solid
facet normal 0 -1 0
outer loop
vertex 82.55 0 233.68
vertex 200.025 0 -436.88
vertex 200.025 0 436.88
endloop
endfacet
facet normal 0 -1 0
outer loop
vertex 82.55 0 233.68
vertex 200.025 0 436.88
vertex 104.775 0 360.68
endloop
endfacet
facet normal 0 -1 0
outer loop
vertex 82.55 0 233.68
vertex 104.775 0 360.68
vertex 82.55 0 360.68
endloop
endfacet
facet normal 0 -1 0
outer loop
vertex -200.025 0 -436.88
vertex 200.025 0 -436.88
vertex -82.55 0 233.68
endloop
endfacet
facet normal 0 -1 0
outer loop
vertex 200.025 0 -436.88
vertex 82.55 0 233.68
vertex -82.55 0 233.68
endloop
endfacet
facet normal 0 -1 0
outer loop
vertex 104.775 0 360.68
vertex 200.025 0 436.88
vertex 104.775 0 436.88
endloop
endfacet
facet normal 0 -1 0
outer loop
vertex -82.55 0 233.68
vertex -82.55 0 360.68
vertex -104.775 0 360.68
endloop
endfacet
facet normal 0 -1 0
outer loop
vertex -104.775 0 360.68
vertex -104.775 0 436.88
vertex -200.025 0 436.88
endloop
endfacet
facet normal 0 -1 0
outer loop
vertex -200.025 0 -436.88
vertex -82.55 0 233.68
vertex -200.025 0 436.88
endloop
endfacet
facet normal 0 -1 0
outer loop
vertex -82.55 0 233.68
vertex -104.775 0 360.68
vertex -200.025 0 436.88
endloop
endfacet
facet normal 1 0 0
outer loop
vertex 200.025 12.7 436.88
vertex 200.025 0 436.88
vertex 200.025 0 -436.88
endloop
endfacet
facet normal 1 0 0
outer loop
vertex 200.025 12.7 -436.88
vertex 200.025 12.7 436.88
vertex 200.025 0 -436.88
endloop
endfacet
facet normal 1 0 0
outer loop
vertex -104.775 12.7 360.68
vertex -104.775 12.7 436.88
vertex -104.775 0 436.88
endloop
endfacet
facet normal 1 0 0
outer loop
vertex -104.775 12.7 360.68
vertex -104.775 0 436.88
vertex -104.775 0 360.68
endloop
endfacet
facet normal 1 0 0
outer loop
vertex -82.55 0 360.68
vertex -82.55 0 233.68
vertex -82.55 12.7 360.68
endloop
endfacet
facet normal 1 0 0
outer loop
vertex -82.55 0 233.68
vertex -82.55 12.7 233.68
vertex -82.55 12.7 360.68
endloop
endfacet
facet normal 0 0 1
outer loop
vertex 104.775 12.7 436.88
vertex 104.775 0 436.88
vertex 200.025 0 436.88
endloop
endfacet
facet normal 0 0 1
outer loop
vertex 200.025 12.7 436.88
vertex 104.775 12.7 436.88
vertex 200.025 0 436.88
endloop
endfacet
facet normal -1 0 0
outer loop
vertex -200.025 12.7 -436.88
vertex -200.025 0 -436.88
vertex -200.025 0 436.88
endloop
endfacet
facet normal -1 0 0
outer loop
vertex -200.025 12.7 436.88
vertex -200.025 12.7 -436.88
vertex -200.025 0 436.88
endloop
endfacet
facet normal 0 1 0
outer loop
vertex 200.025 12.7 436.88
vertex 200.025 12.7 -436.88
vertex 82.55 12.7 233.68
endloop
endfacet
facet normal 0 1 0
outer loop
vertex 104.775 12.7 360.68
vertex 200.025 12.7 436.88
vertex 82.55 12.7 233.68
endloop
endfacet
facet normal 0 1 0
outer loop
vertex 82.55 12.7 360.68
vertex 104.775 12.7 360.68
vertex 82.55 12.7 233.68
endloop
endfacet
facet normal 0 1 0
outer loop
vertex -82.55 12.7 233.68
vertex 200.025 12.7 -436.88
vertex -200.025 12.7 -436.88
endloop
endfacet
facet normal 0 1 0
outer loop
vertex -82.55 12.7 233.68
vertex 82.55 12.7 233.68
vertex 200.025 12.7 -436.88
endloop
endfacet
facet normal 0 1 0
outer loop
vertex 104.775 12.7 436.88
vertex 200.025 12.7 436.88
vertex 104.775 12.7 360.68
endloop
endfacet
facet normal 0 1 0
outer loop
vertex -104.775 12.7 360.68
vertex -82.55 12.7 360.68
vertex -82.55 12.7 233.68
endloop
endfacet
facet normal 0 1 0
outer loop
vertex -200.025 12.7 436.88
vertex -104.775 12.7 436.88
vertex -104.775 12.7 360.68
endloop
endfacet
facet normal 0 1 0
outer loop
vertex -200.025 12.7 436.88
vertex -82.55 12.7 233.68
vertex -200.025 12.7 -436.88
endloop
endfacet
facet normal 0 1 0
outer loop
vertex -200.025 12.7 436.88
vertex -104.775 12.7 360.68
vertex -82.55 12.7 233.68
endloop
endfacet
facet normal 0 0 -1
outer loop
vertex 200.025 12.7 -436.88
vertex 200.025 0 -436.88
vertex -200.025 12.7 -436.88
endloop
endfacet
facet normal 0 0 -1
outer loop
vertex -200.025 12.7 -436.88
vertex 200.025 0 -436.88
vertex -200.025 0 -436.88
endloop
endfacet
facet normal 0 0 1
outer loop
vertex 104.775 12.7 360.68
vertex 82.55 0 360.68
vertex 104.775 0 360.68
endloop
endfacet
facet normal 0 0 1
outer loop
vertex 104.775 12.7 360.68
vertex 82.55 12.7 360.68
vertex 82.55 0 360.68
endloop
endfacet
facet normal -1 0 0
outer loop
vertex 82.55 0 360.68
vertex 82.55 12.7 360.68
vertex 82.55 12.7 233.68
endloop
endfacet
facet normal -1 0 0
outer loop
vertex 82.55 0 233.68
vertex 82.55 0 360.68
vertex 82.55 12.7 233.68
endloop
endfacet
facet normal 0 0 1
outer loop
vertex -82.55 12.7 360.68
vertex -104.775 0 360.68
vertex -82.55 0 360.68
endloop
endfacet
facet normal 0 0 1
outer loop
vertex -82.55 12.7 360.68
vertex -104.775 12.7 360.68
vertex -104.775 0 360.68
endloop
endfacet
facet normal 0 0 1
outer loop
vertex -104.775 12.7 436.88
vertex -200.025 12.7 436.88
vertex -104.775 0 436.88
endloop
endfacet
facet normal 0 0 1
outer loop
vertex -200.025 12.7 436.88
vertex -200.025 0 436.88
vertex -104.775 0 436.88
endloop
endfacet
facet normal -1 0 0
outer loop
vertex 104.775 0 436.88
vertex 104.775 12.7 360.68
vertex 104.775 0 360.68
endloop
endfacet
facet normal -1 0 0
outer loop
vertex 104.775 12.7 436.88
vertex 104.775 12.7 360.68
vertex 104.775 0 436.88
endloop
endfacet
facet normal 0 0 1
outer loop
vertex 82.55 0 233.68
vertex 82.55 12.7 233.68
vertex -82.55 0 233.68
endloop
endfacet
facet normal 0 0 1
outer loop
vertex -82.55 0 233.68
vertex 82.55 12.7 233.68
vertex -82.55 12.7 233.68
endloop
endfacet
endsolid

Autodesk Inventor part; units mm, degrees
ref_plane "YZ Plane" through (0, 0, 0) normal (1, 0, 0) x (0, 1, 0)
ref_plane "XZ Plane" through (0, 0, 0) normal (0, 1, 0) x (-1, 0, 0)
ref_plane "XY Plane" through (0, 0, 0) normal (0, 0, 1) x (1, 0, 0)
sketch "Sketch1" plane through (0, 0, 0) normal (0, 1, 0) x (-1, 0, 0)
  line L0 (200.025, 436.88) -> (-200.025, 436.88)
  line L1 (-200.025, 436.88) -> (-200.025, -436.88)
  line L2 (-200.025, -436.88) -> (200.025, -436.88)
  line L3 (200.025, -436.88) -> (200.025, 436.88)
  line L4 (200.025, 436.88) -> (-200.025, -436.88) construction
  line L5 (-200.025, 436.88) -> (200.025, -436.88) construction
  point P0 (0, 0)
  dimension "d0" = 400.05
  dimension "d1" = 873.76
extrude "Extrusion1" add sketch "Sketch1" along normal blind 12.7
sketch "Sketch4" plane through (0, 12.7, 0) normal (0, 1, 0) x (1, 0, 0)
  line L0 (-82.55, -436.88) -> (82.55, -436.88)
  line L1 (82.55, -436.88) -> (82.55, -233.68)
  line L2 (82.55, -233.68) -> (-82.55, -233.68)
  line L3 (-82.55, -233.68) -> (-82.55, -436.88)
  line L4 (-82.55, -436.88) -> (82.55, -233.68) construction
  line L5 (82.55, -436.88) -> (-82.55, -233.68) construction
  line L6 (-200.025, -436.88) -> (200.025, -436.88) projected
  line L7 (-200.025, 436.88) -> (-200.025, -436.88) projected
  line L8 (200.025, -436.88) -> (200.025, 436.88) projected
  point P0 (0, 0)
  point P1 (0, -335.28)
  dimension "d11" = 0
  dimension "d12" = 165.1
  dimension "d13" = 203.2
  dimension "d19" = 117.475
  dimension "d20" = 117.475
extrude "Extrusion2" cut sketch "Sketch4" against normal through all
sketch "Sketch6" plane through (0, 12.7, 0) normal (0, 1, 0) x (1, 0, 0)
  line L0 (0, 0) -> (0, -436.88) construction
  line L1 (-104.775, -360.68) -> (104.775, -360.68)
  line L2 (104.775, -360.68) -> (104.775, -436.88)
  line L3 (104.775, -436.88) -> (-104.775, -436.88)
  line L4 (-104.775, -436.88) -> (-104.775, -360.68)
  line L5 (-104.775, -360.68) -> (104.775, -436.88) construction
  line L6 (104.775, -360.68) -> (-104.775, -436.88) construction
  line L7 (-200.025, -436.88) -> (-82.55, -436.88) projected
  point P0 (0, -398.78)
  dimension "d24" = 209.55
  dimension "d25" = 76.2
extrude "Extrusion4" cut sketch "Sketch6" against normal through all
properties part number "2020 Wood Base" material "Wood (Birch)"
